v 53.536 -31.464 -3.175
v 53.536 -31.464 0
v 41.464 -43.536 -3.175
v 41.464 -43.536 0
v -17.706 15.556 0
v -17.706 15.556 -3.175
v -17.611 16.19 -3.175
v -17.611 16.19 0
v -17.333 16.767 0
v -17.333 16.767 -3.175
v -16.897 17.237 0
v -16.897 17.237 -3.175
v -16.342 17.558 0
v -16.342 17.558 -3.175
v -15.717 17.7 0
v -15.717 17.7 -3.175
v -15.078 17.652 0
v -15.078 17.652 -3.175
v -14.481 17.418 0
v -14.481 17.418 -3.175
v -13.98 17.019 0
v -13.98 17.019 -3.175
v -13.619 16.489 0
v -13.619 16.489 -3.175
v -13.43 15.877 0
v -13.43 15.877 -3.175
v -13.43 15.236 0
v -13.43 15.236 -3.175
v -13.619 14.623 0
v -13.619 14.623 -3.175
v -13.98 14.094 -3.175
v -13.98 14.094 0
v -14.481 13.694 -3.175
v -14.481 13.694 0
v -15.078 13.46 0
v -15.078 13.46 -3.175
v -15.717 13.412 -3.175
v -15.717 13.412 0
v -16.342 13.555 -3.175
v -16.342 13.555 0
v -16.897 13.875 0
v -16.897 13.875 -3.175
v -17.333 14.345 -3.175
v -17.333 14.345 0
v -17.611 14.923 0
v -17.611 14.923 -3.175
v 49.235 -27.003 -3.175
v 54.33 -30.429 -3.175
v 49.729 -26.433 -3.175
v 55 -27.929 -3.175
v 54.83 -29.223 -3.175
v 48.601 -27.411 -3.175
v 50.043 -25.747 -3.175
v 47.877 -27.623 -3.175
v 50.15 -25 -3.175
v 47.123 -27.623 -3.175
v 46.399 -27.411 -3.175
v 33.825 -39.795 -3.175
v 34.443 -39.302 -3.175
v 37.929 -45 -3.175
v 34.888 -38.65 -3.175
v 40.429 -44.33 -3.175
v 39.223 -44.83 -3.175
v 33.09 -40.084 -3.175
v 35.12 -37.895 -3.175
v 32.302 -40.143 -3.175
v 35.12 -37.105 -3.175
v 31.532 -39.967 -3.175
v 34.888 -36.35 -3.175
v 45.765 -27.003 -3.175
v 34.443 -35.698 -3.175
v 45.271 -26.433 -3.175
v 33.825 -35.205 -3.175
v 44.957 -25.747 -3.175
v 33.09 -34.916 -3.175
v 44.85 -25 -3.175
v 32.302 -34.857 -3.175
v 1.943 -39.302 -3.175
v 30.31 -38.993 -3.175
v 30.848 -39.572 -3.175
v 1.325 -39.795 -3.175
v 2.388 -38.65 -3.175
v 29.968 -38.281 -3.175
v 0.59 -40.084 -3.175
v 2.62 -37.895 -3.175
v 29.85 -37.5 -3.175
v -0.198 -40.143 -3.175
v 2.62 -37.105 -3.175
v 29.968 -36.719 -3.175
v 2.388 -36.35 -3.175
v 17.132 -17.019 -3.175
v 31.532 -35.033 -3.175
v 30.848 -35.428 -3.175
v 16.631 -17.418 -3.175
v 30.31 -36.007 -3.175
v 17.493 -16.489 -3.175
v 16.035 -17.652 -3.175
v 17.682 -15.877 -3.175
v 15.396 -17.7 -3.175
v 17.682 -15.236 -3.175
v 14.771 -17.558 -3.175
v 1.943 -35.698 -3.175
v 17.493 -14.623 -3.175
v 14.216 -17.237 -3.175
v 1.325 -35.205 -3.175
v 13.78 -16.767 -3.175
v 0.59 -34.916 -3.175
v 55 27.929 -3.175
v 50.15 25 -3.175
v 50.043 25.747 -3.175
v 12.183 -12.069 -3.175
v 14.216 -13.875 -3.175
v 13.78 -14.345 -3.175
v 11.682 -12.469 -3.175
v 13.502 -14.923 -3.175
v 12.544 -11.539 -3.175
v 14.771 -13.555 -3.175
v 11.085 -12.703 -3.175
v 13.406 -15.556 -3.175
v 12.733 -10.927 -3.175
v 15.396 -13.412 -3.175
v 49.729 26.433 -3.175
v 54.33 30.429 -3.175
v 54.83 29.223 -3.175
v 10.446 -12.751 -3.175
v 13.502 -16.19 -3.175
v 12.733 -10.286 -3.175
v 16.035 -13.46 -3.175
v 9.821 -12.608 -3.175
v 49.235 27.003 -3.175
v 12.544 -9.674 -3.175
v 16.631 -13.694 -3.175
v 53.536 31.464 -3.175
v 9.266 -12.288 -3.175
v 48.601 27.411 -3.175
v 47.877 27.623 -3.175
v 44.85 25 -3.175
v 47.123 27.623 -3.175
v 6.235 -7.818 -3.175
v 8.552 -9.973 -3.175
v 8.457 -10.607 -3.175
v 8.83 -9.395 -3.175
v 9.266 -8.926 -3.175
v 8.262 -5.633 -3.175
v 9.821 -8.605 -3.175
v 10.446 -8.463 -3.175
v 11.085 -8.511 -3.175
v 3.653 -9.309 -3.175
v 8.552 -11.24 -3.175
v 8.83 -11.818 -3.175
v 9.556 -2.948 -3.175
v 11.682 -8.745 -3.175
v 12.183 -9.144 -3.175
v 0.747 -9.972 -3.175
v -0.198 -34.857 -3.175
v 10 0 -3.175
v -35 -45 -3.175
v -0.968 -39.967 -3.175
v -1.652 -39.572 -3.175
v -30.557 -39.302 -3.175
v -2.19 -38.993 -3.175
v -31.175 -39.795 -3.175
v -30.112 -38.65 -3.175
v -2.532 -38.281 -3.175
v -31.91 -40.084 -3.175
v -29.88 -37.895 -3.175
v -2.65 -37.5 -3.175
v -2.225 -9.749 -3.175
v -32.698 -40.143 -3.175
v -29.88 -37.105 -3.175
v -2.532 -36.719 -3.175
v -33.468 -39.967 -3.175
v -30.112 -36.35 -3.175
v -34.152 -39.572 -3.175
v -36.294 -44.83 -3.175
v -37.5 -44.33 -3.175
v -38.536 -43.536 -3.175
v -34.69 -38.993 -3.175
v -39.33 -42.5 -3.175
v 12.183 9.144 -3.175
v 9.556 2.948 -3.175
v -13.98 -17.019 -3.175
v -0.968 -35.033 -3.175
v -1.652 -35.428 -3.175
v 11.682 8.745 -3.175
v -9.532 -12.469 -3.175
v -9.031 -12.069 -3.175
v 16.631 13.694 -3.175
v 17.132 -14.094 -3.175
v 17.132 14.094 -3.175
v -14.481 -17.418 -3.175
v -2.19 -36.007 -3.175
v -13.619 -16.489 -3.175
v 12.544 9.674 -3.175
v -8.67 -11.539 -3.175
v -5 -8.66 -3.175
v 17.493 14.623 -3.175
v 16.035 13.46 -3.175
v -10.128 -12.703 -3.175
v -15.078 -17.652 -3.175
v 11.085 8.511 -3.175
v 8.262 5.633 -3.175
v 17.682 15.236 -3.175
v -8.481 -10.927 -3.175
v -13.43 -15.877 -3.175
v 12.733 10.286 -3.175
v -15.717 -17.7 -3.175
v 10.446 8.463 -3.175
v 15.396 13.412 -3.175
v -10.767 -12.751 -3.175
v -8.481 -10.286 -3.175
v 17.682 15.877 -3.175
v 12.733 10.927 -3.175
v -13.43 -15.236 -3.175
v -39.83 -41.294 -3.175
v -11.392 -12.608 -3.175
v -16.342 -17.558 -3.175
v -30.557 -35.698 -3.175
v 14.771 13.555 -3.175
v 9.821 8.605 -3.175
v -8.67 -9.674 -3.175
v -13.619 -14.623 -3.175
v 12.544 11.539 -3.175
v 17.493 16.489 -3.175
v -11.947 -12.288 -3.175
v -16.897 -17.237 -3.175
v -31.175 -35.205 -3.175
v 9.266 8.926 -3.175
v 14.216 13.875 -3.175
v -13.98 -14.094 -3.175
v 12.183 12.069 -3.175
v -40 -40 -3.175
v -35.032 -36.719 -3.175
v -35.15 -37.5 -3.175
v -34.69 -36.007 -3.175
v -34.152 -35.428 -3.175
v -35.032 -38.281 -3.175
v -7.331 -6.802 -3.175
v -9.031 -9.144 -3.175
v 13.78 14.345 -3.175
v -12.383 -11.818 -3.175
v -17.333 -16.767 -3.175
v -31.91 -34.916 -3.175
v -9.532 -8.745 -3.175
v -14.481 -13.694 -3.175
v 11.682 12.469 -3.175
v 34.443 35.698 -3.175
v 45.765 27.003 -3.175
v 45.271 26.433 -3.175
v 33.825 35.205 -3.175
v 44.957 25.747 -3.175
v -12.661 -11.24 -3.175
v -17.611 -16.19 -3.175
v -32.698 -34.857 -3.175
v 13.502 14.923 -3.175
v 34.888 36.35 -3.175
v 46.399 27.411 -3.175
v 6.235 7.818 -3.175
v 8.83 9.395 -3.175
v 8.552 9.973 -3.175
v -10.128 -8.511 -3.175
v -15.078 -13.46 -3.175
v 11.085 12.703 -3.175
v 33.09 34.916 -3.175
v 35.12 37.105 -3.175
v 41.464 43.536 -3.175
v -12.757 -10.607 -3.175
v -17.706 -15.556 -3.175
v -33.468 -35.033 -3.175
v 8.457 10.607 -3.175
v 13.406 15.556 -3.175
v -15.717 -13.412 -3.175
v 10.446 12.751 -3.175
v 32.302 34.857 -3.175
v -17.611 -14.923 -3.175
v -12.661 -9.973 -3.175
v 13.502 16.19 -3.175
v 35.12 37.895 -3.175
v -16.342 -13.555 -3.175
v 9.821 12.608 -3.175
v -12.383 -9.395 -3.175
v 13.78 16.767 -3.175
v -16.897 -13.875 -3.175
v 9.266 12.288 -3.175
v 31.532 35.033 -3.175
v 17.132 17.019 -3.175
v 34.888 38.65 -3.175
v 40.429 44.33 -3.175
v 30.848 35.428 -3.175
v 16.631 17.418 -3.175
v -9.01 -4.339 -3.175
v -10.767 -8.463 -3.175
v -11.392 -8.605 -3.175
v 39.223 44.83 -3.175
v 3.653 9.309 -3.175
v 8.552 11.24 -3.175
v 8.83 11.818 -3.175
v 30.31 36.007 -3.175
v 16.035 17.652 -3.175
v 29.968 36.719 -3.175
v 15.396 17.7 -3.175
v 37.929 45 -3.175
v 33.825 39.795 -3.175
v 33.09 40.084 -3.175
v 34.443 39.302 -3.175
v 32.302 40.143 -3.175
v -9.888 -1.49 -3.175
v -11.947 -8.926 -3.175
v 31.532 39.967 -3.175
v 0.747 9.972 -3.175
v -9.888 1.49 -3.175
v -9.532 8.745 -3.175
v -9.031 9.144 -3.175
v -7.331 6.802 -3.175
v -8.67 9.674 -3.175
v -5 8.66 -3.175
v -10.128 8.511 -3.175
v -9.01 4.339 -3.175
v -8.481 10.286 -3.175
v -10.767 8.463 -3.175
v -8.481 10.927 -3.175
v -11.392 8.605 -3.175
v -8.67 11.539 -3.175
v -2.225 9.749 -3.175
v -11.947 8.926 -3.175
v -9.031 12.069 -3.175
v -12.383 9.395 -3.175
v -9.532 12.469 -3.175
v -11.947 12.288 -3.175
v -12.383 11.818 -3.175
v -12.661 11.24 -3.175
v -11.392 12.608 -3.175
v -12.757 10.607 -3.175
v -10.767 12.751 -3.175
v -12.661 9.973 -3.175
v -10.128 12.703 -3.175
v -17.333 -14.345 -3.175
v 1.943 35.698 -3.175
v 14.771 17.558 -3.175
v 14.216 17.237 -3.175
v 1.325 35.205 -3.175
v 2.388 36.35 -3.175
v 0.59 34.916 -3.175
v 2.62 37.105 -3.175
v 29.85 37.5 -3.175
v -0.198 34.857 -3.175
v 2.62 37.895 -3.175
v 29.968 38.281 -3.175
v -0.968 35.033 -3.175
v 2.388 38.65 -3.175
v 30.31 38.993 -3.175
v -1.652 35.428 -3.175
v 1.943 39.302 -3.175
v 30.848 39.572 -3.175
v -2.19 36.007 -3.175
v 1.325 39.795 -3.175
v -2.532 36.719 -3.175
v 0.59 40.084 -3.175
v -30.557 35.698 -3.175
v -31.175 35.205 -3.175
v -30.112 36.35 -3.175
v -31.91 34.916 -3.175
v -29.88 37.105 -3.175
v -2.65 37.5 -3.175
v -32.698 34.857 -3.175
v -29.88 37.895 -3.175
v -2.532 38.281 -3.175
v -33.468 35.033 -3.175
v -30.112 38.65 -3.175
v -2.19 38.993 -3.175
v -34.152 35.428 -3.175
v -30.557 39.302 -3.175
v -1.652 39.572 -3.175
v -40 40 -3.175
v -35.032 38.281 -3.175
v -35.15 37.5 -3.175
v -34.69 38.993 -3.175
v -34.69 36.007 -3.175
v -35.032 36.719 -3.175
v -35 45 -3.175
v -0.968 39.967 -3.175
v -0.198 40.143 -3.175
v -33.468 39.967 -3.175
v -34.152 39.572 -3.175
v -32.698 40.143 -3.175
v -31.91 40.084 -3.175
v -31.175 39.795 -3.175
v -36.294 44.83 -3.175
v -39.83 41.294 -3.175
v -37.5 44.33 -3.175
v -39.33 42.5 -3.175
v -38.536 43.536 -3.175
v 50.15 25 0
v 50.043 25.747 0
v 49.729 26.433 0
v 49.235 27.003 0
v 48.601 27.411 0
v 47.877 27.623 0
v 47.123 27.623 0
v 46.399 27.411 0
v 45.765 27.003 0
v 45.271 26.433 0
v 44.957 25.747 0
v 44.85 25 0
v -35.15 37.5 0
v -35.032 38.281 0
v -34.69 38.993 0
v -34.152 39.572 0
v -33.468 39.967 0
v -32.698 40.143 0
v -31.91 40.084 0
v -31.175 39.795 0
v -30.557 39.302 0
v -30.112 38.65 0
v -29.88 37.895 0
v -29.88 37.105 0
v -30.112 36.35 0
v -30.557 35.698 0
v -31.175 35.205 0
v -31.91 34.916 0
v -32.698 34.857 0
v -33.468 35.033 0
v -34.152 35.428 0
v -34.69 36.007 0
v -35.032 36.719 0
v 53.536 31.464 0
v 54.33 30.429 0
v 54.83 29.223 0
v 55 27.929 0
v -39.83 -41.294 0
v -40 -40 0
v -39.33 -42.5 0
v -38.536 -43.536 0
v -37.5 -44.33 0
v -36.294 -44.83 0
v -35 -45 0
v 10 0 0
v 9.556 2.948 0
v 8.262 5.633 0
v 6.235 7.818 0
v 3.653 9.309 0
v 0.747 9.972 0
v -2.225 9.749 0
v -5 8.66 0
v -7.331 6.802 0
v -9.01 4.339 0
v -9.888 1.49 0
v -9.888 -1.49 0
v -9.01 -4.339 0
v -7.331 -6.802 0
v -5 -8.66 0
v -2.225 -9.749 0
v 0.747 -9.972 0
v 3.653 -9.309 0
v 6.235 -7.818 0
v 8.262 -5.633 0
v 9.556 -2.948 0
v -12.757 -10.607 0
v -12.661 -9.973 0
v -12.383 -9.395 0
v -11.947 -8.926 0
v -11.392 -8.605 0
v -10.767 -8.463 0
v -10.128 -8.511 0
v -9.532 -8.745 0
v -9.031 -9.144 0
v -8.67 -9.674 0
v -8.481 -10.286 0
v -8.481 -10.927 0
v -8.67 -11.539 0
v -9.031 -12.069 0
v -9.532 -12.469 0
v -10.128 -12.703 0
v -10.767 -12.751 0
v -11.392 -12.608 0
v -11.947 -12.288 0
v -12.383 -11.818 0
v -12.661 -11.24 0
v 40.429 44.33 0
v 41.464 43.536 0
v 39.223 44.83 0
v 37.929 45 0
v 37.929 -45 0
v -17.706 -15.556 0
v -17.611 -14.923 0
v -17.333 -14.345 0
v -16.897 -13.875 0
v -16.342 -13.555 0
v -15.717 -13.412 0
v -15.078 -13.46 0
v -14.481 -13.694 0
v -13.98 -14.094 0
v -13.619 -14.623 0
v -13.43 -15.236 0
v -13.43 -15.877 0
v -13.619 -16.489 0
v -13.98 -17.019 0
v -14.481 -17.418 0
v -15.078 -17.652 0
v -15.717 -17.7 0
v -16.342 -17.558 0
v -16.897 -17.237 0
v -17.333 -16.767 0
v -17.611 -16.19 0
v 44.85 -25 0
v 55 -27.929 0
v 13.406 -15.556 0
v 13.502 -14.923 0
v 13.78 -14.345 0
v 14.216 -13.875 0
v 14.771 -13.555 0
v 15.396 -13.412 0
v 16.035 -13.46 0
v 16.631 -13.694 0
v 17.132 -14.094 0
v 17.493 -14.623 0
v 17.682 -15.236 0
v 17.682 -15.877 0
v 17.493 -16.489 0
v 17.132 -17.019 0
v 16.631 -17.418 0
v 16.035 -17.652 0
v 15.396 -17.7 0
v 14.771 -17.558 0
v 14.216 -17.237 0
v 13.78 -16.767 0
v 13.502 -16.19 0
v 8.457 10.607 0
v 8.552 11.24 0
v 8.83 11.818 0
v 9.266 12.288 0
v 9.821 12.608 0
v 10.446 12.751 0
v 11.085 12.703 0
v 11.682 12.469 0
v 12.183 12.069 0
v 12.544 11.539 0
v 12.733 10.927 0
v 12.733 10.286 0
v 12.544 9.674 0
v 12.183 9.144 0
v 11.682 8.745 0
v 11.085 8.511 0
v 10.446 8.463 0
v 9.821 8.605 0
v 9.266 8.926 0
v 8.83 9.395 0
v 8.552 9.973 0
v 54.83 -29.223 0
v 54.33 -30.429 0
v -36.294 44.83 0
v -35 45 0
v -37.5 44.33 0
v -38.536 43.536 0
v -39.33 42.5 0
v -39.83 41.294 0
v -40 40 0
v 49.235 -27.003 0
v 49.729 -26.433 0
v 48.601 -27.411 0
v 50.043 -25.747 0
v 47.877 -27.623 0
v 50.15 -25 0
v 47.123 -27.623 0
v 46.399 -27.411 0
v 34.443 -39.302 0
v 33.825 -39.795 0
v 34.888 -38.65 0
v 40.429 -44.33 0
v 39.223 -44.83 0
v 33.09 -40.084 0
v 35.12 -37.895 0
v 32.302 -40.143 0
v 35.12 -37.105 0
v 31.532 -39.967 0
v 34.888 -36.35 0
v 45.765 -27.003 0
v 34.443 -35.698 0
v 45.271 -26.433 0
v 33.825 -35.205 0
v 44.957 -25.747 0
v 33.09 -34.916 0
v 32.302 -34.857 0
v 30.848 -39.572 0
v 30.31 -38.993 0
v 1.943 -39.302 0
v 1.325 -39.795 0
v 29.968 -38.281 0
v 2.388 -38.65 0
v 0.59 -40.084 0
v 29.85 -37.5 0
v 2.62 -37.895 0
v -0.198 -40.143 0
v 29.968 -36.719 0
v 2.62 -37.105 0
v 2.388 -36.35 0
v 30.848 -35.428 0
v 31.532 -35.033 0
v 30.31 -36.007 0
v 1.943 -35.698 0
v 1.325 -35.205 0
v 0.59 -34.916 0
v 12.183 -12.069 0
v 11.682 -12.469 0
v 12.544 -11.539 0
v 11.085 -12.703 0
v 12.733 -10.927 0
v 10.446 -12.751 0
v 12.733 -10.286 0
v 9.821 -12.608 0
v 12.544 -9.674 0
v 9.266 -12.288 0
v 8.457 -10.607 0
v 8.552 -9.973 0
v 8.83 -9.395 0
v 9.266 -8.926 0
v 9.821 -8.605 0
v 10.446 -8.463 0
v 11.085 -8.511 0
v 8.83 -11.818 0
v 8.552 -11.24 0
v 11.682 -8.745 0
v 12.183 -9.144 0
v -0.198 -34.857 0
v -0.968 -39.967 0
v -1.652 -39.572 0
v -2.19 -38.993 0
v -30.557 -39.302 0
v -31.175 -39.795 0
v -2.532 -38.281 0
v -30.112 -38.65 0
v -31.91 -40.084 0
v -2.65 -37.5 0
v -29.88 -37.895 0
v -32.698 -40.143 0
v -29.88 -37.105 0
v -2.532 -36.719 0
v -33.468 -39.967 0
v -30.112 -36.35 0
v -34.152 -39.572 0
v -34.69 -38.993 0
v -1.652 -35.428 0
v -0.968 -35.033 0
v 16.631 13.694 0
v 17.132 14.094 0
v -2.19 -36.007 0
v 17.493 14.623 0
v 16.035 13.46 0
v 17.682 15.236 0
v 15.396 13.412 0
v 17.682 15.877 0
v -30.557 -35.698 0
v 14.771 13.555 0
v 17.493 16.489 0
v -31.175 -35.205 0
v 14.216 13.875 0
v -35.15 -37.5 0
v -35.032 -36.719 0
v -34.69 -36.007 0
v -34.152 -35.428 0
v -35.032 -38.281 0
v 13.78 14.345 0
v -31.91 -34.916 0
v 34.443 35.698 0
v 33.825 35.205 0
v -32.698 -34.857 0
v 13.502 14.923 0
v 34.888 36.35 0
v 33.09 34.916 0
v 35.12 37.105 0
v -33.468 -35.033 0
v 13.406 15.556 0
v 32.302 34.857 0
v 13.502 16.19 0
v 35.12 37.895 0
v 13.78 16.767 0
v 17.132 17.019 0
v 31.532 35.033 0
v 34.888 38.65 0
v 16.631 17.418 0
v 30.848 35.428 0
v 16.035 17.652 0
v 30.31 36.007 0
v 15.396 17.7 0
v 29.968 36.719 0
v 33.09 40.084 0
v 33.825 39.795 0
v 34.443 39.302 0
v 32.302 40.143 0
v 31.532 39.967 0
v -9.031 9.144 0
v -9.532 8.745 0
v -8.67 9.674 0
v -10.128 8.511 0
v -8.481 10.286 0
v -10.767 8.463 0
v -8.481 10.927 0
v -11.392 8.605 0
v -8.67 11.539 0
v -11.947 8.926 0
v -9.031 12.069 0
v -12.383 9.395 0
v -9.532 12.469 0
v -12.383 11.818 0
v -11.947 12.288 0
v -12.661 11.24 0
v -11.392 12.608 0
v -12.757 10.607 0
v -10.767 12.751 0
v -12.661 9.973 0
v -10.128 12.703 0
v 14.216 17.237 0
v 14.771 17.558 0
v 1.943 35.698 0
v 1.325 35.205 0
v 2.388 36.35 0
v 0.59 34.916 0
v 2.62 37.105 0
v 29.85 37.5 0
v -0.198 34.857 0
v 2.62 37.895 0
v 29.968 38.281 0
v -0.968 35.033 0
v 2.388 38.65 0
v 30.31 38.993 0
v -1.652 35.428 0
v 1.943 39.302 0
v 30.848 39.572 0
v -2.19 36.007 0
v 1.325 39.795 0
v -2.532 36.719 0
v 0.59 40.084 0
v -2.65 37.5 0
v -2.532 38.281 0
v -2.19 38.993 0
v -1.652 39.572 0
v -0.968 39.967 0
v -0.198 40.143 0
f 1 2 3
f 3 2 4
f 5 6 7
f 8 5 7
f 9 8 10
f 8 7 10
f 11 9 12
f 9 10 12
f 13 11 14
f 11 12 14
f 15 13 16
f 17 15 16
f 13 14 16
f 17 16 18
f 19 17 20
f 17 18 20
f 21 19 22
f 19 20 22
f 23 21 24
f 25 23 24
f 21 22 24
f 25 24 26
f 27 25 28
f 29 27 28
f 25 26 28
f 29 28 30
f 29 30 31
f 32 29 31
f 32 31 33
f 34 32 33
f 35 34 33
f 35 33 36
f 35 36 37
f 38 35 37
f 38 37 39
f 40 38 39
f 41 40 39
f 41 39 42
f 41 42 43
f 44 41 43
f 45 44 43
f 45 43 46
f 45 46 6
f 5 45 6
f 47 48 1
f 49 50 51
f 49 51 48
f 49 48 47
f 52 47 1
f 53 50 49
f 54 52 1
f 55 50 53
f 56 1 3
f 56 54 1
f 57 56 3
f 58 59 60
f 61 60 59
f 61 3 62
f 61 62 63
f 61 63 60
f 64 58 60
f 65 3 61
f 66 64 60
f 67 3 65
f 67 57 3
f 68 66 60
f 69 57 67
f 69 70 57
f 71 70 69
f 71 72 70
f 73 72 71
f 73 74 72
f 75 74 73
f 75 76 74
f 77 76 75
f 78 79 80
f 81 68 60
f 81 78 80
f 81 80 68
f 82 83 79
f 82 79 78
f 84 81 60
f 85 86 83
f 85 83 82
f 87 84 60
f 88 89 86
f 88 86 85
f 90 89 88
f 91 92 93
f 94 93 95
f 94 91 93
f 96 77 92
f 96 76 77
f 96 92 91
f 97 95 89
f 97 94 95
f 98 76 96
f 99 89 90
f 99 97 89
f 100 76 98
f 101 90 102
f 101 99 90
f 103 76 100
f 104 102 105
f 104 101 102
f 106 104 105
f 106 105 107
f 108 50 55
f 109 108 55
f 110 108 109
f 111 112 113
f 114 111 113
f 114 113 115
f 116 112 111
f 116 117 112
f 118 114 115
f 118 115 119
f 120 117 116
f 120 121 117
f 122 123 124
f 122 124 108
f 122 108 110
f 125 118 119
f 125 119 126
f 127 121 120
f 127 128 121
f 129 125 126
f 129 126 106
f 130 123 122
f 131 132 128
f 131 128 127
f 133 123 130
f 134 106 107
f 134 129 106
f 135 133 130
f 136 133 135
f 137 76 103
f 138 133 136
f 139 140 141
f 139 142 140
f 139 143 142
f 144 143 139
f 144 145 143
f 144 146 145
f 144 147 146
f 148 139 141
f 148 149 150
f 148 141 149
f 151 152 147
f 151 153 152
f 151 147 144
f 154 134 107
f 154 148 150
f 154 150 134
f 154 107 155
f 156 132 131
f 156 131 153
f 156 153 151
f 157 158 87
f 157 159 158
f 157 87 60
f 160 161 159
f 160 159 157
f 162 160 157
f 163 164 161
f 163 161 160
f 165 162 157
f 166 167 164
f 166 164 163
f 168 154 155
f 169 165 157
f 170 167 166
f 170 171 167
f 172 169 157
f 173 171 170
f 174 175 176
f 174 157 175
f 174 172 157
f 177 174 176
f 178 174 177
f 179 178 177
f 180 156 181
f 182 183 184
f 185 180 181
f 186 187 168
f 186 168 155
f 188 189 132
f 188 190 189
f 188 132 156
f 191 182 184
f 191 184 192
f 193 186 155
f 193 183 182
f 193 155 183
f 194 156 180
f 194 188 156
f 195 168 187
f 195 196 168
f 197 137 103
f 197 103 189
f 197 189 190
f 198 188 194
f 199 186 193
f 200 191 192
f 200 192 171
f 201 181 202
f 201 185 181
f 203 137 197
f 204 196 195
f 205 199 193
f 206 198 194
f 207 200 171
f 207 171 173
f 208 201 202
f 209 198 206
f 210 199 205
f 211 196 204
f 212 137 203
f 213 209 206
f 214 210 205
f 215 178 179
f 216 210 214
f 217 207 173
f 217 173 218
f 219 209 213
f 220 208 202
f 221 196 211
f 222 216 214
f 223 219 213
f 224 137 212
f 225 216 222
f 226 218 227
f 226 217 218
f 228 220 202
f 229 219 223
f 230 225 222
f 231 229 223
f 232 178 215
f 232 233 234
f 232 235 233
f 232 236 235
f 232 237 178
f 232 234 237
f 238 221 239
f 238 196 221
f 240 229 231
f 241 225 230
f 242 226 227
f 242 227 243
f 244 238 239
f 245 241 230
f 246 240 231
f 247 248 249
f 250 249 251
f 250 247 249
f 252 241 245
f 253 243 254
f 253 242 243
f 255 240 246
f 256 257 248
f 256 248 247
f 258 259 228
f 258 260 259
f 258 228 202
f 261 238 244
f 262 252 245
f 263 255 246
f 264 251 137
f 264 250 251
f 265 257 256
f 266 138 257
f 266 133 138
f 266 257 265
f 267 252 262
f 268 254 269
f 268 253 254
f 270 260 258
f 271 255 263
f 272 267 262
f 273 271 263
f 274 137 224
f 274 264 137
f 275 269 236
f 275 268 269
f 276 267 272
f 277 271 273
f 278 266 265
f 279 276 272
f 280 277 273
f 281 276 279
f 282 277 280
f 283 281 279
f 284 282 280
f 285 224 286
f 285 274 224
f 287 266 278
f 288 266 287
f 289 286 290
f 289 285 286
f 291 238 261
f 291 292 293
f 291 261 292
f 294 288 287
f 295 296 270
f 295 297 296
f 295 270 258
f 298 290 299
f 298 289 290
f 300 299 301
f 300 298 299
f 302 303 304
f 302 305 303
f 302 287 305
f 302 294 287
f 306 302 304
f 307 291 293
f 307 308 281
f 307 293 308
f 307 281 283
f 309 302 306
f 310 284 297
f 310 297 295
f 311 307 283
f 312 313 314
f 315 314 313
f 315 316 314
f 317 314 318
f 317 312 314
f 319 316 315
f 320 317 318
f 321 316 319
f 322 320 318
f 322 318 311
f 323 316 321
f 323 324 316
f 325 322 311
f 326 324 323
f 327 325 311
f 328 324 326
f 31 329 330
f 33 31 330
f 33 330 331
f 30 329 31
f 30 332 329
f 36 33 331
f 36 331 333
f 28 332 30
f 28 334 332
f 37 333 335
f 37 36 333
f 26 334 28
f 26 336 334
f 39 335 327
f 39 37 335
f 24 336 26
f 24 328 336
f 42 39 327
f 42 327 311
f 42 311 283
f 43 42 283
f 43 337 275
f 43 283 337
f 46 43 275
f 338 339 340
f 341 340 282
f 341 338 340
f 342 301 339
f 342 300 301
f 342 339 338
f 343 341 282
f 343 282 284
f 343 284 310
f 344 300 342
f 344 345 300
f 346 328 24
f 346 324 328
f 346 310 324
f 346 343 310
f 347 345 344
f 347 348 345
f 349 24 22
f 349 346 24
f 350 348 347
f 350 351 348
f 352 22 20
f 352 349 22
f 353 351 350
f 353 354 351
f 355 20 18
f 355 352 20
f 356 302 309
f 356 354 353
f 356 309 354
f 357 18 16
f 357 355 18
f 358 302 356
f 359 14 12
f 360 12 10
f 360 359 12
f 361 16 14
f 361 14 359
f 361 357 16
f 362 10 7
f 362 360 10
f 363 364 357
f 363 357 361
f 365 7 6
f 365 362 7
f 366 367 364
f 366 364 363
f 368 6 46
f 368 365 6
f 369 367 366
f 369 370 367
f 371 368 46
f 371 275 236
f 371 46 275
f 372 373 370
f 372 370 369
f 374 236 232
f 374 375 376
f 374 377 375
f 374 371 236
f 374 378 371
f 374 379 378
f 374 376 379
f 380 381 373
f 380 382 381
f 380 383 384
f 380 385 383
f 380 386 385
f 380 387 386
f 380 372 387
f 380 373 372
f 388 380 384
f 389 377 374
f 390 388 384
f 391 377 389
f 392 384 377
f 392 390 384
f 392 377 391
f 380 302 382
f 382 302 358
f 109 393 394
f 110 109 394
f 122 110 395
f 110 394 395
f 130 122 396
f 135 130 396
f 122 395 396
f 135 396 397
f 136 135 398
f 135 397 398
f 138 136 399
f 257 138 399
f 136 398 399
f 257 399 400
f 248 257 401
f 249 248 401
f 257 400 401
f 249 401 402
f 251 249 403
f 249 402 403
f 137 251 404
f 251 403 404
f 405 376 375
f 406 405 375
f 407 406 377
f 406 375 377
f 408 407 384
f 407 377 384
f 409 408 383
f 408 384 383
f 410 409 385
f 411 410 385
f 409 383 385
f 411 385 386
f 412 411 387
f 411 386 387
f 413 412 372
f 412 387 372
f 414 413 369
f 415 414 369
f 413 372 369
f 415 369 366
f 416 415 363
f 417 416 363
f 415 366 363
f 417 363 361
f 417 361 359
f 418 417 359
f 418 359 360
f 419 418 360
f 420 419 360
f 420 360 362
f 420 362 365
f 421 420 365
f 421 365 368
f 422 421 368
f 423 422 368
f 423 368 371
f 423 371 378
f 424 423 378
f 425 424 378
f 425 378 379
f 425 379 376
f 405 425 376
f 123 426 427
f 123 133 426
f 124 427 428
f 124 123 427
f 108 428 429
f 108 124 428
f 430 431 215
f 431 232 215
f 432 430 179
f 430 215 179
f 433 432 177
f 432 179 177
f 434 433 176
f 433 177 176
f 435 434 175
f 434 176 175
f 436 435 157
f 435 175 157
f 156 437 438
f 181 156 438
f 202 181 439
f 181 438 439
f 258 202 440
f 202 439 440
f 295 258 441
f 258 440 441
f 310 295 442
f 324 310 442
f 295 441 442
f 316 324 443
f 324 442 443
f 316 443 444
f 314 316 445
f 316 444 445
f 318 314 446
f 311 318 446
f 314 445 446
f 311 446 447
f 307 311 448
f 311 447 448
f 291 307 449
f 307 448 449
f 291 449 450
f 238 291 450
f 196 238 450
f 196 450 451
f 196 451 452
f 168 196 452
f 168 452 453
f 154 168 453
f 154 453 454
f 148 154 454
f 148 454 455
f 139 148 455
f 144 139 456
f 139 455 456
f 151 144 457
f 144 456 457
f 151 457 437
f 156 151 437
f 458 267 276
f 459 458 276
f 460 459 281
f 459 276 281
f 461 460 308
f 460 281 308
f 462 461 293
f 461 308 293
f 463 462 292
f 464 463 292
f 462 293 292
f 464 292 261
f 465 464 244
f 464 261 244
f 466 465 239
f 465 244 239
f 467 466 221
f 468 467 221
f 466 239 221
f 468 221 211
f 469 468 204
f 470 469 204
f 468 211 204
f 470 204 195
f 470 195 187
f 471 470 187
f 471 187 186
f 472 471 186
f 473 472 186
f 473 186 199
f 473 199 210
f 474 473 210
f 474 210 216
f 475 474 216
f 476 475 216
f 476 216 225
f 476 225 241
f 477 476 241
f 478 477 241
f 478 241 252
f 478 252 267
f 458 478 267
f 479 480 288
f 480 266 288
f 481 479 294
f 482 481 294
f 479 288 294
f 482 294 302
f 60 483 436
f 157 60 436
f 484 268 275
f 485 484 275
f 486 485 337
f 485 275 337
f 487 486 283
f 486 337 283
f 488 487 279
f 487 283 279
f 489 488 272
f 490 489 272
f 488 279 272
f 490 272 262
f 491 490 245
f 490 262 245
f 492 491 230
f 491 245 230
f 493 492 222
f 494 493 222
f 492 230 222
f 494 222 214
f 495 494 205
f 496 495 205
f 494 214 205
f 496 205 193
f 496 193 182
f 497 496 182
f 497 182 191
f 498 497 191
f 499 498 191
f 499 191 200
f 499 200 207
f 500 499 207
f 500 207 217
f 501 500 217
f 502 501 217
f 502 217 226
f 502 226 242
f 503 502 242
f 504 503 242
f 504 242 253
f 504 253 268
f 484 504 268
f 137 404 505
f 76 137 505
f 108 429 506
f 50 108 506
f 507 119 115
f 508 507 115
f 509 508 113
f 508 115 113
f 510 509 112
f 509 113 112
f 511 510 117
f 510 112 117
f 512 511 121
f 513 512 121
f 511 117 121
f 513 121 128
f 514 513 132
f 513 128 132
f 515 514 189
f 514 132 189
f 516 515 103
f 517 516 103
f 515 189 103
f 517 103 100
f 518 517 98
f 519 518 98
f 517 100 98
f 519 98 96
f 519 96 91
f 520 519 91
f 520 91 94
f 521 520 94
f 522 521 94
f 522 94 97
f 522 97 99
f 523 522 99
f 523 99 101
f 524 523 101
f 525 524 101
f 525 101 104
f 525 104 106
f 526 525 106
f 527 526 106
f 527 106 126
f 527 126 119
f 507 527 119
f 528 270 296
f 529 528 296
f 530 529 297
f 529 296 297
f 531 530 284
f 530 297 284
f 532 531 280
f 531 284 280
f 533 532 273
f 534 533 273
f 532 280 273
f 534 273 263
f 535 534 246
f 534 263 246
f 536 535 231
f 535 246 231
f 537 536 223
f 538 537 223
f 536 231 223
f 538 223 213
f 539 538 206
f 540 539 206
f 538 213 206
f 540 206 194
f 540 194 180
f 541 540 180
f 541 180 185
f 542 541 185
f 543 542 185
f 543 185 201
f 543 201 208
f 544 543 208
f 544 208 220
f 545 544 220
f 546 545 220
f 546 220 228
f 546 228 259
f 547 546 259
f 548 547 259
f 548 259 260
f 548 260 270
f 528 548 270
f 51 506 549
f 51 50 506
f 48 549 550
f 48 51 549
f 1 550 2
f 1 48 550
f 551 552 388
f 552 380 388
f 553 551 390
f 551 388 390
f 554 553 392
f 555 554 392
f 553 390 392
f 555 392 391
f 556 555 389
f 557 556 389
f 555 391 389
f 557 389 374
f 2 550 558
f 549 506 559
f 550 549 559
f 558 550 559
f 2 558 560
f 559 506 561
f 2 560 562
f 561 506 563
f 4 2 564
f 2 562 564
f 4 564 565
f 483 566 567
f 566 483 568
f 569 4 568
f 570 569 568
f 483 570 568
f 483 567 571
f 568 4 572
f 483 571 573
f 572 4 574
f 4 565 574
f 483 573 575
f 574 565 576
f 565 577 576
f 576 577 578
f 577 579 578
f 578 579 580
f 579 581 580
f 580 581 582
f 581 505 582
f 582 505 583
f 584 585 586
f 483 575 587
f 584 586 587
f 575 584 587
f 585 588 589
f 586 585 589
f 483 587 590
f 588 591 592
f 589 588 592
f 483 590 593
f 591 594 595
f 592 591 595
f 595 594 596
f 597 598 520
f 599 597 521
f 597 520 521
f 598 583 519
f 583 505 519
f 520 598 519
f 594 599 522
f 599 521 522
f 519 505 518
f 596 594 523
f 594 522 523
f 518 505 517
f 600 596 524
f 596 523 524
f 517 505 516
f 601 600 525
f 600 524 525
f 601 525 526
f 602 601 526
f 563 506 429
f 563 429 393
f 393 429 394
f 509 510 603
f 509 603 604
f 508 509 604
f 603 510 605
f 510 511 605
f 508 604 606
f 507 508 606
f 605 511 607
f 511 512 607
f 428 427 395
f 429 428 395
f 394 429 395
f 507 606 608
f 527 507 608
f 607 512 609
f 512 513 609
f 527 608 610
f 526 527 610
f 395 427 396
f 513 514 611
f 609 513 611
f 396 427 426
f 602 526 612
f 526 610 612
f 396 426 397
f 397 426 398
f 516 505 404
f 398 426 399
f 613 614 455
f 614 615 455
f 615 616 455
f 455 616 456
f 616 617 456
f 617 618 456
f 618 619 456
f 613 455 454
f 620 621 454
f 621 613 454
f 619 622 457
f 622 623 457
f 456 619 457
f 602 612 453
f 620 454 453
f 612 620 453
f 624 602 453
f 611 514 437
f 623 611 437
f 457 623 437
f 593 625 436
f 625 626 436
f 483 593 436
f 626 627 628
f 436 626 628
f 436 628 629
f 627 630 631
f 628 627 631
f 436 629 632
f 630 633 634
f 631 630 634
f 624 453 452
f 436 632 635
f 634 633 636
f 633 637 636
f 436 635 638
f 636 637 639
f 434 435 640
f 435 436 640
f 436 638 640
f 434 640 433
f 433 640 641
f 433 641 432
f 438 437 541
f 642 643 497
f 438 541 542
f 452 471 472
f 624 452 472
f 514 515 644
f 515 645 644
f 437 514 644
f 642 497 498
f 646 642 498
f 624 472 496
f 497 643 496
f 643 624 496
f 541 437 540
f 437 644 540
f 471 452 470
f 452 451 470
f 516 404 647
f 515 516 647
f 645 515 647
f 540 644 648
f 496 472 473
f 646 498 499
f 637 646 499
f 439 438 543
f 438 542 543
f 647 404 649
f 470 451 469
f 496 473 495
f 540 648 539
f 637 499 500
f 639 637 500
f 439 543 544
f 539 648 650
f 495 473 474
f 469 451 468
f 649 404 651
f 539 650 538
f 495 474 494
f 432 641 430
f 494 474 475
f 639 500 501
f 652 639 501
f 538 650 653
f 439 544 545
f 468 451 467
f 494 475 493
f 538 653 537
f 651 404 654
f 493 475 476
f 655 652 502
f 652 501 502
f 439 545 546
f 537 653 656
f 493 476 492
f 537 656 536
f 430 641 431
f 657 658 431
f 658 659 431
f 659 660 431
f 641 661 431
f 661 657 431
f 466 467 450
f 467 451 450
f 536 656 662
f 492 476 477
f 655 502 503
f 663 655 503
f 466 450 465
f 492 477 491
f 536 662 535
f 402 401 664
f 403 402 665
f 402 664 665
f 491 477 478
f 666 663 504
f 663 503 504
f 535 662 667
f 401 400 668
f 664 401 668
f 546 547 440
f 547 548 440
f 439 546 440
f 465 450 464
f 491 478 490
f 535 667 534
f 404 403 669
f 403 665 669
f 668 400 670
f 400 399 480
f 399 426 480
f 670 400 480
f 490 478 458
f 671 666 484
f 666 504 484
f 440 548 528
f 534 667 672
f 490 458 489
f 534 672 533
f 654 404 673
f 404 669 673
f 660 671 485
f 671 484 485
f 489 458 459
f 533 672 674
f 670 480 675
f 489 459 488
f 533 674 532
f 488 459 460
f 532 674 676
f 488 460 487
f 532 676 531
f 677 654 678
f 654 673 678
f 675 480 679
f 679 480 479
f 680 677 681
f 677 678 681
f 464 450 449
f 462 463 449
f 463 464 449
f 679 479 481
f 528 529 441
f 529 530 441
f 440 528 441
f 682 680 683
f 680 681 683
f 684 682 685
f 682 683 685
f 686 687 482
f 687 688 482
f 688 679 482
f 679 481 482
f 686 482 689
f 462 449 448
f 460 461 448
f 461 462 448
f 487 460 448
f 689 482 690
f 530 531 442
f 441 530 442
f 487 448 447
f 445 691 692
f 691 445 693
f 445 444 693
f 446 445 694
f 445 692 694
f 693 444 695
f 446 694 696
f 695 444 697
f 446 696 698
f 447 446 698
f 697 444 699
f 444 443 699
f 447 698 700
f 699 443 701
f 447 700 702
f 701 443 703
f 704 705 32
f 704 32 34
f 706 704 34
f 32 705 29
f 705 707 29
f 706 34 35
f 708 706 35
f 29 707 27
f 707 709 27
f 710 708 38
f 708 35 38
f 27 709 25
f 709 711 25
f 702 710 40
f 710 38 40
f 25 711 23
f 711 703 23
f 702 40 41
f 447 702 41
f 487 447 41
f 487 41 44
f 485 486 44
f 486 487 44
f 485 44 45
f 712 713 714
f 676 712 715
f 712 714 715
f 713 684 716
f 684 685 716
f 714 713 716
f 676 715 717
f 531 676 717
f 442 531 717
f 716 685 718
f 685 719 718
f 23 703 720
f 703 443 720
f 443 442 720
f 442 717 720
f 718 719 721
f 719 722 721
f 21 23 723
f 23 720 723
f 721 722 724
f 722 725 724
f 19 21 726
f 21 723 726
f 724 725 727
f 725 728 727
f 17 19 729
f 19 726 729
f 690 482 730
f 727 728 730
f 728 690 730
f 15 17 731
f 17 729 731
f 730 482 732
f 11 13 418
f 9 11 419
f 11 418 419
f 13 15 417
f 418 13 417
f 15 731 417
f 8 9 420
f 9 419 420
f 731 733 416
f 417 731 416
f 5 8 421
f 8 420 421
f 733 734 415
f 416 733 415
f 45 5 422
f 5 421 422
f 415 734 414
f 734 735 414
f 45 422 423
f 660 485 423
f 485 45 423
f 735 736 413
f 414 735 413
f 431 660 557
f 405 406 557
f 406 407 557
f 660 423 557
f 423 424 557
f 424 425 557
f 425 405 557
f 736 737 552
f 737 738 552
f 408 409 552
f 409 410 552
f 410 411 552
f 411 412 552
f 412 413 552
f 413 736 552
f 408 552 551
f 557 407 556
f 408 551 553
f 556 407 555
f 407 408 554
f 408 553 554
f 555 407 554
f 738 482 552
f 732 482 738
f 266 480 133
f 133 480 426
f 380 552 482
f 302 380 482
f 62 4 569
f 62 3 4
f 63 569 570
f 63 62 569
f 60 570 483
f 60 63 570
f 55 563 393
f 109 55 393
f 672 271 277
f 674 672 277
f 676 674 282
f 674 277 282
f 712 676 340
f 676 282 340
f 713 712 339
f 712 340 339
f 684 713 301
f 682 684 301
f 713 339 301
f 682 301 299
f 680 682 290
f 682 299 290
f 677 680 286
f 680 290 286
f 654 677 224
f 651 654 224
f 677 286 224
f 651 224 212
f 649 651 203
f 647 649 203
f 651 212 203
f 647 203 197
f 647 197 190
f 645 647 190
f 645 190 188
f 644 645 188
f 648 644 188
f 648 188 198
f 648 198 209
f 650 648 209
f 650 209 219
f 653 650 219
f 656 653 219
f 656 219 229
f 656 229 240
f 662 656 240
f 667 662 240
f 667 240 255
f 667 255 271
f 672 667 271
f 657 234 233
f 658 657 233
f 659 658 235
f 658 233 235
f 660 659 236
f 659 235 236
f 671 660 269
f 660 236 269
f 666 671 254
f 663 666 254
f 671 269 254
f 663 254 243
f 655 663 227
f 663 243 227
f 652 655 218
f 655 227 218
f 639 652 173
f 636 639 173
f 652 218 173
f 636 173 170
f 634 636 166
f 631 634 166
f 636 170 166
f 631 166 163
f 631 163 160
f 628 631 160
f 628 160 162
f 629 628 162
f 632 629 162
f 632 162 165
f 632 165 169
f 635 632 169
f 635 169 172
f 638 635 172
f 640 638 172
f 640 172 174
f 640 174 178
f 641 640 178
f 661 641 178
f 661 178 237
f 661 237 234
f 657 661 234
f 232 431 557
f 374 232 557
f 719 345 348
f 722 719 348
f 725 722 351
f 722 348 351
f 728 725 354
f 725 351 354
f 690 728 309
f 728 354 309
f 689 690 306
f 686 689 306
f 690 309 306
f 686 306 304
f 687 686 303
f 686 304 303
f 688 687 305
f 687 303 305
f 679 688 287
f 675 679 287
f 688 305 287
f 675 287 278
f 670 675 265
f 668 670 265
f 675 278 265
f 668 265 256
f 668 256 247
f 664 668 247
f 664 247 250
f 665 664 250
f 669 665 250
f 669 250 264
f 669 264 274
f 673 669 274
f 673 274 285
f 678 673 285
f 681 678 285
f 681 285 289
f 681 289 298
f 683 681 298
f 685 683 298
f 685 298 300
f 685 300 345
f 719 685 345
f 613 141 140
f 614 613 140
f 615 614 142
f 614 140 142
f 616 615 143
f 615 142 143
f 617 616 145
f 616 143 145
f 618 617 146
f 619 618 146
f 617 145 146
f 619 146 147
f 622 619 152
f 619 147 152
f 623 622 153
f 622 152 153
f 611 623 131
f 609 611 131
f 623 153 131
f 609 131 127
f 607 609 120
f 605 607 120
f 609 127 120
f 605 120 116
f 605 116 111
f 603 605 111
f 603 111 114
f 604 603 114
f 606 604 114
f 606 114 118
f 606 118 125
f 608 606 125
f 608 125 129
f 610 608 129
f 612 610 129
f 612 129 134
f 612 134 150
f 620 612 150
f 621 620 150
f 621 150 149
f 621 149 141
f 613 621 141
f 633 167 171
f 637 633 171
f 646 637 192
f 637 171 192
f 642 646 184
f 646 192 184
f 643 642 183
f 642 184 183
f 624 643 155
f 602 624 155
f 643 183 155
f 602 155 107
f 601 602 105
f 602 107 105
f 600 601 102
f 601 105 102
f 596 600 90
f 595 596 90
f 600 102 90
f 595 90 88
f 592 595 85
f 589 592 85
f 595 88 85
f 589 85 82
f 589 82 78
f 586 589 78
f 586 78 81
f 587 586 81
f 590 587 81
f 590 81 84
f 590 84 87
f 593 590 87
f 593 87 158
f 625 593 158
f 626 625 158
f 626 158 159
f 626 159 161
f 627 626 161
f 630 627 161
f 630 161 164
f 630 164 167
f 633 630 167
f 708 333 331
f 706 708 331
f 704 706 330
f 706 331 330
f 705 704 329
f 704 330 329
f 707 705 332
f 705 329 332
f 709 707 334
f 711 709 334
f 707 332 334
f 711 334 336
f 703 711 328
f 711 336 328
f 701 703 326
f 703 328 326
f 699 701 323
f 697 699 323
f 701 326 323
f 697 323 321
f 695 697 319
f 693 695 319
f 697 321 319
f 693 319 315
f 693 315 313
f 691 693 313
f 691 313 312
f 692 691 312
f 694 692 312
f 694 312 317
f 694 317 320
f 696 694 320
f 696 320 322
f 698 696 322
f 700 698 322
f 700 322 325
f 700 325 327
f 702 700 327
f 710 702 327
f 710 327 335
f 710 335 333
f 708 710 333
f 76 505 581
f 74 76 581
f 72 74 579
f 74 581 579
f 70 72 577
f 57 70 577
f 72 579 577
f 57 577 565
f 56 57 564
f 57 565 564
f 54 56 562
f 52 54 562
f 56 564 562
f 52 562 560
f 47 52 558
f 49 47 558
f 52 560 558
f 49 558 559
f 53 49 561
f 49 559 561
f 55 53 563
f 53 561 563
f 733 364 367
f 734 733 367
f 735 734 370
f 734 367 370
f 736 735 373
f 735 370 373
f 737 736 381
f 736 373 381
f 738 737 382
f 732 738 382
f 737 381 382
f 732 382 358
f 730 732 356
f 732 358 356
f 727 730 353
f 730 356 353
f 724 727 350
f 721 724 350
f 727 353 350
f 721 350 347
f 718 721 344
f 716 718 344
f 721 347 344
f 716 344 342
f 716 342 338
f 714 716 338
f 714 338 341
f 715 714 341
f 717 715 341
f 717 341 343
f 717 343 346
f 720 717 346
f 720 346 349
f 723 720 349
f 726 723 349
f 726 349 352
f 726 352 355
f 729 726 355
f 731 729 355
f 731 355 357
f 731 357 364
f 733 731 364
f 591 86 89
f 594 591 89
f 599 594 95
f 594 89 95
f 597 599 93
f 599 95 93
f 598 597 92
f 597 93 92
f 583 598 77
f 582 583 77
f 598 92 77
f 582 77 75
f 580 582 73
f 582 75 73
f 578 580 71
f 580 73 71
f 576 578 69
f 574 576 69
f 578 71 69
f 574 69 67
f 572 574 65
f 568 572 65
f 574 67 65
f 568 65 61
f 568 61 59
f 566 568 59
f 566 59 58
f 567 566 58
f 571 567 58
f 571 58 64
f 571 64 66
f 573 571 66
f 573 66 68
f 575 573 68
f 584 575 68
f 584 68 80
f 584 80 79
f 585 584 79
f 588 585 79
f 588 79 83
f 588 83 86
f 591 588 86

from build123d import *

# Parameters (mm, degrees)
SKETCH1_R            = 10
BASE_FLANGE1_DEPTH   = 3.175
M4_CLEARANCE_HOLE1_D = 4.3
M5_CLEARANCE_HOLE1_D = 5.3
FILLET1_R            = 5


# Sheet-metal steps are written as plain solids
with BuildPart() as part:
    # Sketch1 → Base-Flange1 (new body)
    with BuildSketch(Plane.XY):
        Polygon((40, 45), (55, 30), (55, -30), (40, -45), (-40, -45), (-40, 45), align=None)
        Circle(SKETCH1_R, mode=Mode.SUBTRACT)
        with BuildLine():
            Line((44.85, 25), (44.85, -25))
            ThreePointArc((44.85, -25), (47.5, -27.65), (50.15, -25))
            Line((50.15, -25), (50.15, 25))
            ThreePointArc((50.15, 25), (47.5, 27.65), (44.85, 25))
        make_face(mode=Mode.SUBTRACT)
    extrude(amount=-BASE_FLANGE1_DEPTH)

    # M4 Clearance Hole1 (through all)
    with Locations(Plane(origin=(-15.556349186, 15.556349186, 0), x_dir=(1, 0, 0), z_dir=(0, 0, 1))):
        with Locations((0, 0), (31.112698372, 0), (26.162950904, -4.949747468), (4.949747468, -4.949747468), (0, -31.112698372), (31.112698372, -31.112698372), (26.162950904, -26.162950904), (4.949747468, -26.162950904)):
            Hole(M4_CLEARANCE_HOLE1_D / 2)

    # M5 Clearance Hole1 (through all)
    with Locations(Plane(origin=(-32.5, 37.5, 0), x_dir=(1, 0, 0), z_dir=(0, 0, 1))):
        with Locations((0, 0), (65, 0), (65, -75), (0, -75), (32.5, 0), (32.5, -75)):
            Hole(M5_CLEARANCE_HOLE1_D / 2)

    # Fillet1
    fillet1_edges = [part.edges().sort_by_distance(p)[0] for p in [
        (-40, 45, -1.5875),
        (40, 45, -1.5875),
        (55, 30, -1.5875),
        (55, -30, -1.5875),
        (40, -45, -1.5875),
        (-40, -45, -1.5875),
    ]]
    fillet(fillet1_edges, radius=FILLET1_R)


solid = part.part
